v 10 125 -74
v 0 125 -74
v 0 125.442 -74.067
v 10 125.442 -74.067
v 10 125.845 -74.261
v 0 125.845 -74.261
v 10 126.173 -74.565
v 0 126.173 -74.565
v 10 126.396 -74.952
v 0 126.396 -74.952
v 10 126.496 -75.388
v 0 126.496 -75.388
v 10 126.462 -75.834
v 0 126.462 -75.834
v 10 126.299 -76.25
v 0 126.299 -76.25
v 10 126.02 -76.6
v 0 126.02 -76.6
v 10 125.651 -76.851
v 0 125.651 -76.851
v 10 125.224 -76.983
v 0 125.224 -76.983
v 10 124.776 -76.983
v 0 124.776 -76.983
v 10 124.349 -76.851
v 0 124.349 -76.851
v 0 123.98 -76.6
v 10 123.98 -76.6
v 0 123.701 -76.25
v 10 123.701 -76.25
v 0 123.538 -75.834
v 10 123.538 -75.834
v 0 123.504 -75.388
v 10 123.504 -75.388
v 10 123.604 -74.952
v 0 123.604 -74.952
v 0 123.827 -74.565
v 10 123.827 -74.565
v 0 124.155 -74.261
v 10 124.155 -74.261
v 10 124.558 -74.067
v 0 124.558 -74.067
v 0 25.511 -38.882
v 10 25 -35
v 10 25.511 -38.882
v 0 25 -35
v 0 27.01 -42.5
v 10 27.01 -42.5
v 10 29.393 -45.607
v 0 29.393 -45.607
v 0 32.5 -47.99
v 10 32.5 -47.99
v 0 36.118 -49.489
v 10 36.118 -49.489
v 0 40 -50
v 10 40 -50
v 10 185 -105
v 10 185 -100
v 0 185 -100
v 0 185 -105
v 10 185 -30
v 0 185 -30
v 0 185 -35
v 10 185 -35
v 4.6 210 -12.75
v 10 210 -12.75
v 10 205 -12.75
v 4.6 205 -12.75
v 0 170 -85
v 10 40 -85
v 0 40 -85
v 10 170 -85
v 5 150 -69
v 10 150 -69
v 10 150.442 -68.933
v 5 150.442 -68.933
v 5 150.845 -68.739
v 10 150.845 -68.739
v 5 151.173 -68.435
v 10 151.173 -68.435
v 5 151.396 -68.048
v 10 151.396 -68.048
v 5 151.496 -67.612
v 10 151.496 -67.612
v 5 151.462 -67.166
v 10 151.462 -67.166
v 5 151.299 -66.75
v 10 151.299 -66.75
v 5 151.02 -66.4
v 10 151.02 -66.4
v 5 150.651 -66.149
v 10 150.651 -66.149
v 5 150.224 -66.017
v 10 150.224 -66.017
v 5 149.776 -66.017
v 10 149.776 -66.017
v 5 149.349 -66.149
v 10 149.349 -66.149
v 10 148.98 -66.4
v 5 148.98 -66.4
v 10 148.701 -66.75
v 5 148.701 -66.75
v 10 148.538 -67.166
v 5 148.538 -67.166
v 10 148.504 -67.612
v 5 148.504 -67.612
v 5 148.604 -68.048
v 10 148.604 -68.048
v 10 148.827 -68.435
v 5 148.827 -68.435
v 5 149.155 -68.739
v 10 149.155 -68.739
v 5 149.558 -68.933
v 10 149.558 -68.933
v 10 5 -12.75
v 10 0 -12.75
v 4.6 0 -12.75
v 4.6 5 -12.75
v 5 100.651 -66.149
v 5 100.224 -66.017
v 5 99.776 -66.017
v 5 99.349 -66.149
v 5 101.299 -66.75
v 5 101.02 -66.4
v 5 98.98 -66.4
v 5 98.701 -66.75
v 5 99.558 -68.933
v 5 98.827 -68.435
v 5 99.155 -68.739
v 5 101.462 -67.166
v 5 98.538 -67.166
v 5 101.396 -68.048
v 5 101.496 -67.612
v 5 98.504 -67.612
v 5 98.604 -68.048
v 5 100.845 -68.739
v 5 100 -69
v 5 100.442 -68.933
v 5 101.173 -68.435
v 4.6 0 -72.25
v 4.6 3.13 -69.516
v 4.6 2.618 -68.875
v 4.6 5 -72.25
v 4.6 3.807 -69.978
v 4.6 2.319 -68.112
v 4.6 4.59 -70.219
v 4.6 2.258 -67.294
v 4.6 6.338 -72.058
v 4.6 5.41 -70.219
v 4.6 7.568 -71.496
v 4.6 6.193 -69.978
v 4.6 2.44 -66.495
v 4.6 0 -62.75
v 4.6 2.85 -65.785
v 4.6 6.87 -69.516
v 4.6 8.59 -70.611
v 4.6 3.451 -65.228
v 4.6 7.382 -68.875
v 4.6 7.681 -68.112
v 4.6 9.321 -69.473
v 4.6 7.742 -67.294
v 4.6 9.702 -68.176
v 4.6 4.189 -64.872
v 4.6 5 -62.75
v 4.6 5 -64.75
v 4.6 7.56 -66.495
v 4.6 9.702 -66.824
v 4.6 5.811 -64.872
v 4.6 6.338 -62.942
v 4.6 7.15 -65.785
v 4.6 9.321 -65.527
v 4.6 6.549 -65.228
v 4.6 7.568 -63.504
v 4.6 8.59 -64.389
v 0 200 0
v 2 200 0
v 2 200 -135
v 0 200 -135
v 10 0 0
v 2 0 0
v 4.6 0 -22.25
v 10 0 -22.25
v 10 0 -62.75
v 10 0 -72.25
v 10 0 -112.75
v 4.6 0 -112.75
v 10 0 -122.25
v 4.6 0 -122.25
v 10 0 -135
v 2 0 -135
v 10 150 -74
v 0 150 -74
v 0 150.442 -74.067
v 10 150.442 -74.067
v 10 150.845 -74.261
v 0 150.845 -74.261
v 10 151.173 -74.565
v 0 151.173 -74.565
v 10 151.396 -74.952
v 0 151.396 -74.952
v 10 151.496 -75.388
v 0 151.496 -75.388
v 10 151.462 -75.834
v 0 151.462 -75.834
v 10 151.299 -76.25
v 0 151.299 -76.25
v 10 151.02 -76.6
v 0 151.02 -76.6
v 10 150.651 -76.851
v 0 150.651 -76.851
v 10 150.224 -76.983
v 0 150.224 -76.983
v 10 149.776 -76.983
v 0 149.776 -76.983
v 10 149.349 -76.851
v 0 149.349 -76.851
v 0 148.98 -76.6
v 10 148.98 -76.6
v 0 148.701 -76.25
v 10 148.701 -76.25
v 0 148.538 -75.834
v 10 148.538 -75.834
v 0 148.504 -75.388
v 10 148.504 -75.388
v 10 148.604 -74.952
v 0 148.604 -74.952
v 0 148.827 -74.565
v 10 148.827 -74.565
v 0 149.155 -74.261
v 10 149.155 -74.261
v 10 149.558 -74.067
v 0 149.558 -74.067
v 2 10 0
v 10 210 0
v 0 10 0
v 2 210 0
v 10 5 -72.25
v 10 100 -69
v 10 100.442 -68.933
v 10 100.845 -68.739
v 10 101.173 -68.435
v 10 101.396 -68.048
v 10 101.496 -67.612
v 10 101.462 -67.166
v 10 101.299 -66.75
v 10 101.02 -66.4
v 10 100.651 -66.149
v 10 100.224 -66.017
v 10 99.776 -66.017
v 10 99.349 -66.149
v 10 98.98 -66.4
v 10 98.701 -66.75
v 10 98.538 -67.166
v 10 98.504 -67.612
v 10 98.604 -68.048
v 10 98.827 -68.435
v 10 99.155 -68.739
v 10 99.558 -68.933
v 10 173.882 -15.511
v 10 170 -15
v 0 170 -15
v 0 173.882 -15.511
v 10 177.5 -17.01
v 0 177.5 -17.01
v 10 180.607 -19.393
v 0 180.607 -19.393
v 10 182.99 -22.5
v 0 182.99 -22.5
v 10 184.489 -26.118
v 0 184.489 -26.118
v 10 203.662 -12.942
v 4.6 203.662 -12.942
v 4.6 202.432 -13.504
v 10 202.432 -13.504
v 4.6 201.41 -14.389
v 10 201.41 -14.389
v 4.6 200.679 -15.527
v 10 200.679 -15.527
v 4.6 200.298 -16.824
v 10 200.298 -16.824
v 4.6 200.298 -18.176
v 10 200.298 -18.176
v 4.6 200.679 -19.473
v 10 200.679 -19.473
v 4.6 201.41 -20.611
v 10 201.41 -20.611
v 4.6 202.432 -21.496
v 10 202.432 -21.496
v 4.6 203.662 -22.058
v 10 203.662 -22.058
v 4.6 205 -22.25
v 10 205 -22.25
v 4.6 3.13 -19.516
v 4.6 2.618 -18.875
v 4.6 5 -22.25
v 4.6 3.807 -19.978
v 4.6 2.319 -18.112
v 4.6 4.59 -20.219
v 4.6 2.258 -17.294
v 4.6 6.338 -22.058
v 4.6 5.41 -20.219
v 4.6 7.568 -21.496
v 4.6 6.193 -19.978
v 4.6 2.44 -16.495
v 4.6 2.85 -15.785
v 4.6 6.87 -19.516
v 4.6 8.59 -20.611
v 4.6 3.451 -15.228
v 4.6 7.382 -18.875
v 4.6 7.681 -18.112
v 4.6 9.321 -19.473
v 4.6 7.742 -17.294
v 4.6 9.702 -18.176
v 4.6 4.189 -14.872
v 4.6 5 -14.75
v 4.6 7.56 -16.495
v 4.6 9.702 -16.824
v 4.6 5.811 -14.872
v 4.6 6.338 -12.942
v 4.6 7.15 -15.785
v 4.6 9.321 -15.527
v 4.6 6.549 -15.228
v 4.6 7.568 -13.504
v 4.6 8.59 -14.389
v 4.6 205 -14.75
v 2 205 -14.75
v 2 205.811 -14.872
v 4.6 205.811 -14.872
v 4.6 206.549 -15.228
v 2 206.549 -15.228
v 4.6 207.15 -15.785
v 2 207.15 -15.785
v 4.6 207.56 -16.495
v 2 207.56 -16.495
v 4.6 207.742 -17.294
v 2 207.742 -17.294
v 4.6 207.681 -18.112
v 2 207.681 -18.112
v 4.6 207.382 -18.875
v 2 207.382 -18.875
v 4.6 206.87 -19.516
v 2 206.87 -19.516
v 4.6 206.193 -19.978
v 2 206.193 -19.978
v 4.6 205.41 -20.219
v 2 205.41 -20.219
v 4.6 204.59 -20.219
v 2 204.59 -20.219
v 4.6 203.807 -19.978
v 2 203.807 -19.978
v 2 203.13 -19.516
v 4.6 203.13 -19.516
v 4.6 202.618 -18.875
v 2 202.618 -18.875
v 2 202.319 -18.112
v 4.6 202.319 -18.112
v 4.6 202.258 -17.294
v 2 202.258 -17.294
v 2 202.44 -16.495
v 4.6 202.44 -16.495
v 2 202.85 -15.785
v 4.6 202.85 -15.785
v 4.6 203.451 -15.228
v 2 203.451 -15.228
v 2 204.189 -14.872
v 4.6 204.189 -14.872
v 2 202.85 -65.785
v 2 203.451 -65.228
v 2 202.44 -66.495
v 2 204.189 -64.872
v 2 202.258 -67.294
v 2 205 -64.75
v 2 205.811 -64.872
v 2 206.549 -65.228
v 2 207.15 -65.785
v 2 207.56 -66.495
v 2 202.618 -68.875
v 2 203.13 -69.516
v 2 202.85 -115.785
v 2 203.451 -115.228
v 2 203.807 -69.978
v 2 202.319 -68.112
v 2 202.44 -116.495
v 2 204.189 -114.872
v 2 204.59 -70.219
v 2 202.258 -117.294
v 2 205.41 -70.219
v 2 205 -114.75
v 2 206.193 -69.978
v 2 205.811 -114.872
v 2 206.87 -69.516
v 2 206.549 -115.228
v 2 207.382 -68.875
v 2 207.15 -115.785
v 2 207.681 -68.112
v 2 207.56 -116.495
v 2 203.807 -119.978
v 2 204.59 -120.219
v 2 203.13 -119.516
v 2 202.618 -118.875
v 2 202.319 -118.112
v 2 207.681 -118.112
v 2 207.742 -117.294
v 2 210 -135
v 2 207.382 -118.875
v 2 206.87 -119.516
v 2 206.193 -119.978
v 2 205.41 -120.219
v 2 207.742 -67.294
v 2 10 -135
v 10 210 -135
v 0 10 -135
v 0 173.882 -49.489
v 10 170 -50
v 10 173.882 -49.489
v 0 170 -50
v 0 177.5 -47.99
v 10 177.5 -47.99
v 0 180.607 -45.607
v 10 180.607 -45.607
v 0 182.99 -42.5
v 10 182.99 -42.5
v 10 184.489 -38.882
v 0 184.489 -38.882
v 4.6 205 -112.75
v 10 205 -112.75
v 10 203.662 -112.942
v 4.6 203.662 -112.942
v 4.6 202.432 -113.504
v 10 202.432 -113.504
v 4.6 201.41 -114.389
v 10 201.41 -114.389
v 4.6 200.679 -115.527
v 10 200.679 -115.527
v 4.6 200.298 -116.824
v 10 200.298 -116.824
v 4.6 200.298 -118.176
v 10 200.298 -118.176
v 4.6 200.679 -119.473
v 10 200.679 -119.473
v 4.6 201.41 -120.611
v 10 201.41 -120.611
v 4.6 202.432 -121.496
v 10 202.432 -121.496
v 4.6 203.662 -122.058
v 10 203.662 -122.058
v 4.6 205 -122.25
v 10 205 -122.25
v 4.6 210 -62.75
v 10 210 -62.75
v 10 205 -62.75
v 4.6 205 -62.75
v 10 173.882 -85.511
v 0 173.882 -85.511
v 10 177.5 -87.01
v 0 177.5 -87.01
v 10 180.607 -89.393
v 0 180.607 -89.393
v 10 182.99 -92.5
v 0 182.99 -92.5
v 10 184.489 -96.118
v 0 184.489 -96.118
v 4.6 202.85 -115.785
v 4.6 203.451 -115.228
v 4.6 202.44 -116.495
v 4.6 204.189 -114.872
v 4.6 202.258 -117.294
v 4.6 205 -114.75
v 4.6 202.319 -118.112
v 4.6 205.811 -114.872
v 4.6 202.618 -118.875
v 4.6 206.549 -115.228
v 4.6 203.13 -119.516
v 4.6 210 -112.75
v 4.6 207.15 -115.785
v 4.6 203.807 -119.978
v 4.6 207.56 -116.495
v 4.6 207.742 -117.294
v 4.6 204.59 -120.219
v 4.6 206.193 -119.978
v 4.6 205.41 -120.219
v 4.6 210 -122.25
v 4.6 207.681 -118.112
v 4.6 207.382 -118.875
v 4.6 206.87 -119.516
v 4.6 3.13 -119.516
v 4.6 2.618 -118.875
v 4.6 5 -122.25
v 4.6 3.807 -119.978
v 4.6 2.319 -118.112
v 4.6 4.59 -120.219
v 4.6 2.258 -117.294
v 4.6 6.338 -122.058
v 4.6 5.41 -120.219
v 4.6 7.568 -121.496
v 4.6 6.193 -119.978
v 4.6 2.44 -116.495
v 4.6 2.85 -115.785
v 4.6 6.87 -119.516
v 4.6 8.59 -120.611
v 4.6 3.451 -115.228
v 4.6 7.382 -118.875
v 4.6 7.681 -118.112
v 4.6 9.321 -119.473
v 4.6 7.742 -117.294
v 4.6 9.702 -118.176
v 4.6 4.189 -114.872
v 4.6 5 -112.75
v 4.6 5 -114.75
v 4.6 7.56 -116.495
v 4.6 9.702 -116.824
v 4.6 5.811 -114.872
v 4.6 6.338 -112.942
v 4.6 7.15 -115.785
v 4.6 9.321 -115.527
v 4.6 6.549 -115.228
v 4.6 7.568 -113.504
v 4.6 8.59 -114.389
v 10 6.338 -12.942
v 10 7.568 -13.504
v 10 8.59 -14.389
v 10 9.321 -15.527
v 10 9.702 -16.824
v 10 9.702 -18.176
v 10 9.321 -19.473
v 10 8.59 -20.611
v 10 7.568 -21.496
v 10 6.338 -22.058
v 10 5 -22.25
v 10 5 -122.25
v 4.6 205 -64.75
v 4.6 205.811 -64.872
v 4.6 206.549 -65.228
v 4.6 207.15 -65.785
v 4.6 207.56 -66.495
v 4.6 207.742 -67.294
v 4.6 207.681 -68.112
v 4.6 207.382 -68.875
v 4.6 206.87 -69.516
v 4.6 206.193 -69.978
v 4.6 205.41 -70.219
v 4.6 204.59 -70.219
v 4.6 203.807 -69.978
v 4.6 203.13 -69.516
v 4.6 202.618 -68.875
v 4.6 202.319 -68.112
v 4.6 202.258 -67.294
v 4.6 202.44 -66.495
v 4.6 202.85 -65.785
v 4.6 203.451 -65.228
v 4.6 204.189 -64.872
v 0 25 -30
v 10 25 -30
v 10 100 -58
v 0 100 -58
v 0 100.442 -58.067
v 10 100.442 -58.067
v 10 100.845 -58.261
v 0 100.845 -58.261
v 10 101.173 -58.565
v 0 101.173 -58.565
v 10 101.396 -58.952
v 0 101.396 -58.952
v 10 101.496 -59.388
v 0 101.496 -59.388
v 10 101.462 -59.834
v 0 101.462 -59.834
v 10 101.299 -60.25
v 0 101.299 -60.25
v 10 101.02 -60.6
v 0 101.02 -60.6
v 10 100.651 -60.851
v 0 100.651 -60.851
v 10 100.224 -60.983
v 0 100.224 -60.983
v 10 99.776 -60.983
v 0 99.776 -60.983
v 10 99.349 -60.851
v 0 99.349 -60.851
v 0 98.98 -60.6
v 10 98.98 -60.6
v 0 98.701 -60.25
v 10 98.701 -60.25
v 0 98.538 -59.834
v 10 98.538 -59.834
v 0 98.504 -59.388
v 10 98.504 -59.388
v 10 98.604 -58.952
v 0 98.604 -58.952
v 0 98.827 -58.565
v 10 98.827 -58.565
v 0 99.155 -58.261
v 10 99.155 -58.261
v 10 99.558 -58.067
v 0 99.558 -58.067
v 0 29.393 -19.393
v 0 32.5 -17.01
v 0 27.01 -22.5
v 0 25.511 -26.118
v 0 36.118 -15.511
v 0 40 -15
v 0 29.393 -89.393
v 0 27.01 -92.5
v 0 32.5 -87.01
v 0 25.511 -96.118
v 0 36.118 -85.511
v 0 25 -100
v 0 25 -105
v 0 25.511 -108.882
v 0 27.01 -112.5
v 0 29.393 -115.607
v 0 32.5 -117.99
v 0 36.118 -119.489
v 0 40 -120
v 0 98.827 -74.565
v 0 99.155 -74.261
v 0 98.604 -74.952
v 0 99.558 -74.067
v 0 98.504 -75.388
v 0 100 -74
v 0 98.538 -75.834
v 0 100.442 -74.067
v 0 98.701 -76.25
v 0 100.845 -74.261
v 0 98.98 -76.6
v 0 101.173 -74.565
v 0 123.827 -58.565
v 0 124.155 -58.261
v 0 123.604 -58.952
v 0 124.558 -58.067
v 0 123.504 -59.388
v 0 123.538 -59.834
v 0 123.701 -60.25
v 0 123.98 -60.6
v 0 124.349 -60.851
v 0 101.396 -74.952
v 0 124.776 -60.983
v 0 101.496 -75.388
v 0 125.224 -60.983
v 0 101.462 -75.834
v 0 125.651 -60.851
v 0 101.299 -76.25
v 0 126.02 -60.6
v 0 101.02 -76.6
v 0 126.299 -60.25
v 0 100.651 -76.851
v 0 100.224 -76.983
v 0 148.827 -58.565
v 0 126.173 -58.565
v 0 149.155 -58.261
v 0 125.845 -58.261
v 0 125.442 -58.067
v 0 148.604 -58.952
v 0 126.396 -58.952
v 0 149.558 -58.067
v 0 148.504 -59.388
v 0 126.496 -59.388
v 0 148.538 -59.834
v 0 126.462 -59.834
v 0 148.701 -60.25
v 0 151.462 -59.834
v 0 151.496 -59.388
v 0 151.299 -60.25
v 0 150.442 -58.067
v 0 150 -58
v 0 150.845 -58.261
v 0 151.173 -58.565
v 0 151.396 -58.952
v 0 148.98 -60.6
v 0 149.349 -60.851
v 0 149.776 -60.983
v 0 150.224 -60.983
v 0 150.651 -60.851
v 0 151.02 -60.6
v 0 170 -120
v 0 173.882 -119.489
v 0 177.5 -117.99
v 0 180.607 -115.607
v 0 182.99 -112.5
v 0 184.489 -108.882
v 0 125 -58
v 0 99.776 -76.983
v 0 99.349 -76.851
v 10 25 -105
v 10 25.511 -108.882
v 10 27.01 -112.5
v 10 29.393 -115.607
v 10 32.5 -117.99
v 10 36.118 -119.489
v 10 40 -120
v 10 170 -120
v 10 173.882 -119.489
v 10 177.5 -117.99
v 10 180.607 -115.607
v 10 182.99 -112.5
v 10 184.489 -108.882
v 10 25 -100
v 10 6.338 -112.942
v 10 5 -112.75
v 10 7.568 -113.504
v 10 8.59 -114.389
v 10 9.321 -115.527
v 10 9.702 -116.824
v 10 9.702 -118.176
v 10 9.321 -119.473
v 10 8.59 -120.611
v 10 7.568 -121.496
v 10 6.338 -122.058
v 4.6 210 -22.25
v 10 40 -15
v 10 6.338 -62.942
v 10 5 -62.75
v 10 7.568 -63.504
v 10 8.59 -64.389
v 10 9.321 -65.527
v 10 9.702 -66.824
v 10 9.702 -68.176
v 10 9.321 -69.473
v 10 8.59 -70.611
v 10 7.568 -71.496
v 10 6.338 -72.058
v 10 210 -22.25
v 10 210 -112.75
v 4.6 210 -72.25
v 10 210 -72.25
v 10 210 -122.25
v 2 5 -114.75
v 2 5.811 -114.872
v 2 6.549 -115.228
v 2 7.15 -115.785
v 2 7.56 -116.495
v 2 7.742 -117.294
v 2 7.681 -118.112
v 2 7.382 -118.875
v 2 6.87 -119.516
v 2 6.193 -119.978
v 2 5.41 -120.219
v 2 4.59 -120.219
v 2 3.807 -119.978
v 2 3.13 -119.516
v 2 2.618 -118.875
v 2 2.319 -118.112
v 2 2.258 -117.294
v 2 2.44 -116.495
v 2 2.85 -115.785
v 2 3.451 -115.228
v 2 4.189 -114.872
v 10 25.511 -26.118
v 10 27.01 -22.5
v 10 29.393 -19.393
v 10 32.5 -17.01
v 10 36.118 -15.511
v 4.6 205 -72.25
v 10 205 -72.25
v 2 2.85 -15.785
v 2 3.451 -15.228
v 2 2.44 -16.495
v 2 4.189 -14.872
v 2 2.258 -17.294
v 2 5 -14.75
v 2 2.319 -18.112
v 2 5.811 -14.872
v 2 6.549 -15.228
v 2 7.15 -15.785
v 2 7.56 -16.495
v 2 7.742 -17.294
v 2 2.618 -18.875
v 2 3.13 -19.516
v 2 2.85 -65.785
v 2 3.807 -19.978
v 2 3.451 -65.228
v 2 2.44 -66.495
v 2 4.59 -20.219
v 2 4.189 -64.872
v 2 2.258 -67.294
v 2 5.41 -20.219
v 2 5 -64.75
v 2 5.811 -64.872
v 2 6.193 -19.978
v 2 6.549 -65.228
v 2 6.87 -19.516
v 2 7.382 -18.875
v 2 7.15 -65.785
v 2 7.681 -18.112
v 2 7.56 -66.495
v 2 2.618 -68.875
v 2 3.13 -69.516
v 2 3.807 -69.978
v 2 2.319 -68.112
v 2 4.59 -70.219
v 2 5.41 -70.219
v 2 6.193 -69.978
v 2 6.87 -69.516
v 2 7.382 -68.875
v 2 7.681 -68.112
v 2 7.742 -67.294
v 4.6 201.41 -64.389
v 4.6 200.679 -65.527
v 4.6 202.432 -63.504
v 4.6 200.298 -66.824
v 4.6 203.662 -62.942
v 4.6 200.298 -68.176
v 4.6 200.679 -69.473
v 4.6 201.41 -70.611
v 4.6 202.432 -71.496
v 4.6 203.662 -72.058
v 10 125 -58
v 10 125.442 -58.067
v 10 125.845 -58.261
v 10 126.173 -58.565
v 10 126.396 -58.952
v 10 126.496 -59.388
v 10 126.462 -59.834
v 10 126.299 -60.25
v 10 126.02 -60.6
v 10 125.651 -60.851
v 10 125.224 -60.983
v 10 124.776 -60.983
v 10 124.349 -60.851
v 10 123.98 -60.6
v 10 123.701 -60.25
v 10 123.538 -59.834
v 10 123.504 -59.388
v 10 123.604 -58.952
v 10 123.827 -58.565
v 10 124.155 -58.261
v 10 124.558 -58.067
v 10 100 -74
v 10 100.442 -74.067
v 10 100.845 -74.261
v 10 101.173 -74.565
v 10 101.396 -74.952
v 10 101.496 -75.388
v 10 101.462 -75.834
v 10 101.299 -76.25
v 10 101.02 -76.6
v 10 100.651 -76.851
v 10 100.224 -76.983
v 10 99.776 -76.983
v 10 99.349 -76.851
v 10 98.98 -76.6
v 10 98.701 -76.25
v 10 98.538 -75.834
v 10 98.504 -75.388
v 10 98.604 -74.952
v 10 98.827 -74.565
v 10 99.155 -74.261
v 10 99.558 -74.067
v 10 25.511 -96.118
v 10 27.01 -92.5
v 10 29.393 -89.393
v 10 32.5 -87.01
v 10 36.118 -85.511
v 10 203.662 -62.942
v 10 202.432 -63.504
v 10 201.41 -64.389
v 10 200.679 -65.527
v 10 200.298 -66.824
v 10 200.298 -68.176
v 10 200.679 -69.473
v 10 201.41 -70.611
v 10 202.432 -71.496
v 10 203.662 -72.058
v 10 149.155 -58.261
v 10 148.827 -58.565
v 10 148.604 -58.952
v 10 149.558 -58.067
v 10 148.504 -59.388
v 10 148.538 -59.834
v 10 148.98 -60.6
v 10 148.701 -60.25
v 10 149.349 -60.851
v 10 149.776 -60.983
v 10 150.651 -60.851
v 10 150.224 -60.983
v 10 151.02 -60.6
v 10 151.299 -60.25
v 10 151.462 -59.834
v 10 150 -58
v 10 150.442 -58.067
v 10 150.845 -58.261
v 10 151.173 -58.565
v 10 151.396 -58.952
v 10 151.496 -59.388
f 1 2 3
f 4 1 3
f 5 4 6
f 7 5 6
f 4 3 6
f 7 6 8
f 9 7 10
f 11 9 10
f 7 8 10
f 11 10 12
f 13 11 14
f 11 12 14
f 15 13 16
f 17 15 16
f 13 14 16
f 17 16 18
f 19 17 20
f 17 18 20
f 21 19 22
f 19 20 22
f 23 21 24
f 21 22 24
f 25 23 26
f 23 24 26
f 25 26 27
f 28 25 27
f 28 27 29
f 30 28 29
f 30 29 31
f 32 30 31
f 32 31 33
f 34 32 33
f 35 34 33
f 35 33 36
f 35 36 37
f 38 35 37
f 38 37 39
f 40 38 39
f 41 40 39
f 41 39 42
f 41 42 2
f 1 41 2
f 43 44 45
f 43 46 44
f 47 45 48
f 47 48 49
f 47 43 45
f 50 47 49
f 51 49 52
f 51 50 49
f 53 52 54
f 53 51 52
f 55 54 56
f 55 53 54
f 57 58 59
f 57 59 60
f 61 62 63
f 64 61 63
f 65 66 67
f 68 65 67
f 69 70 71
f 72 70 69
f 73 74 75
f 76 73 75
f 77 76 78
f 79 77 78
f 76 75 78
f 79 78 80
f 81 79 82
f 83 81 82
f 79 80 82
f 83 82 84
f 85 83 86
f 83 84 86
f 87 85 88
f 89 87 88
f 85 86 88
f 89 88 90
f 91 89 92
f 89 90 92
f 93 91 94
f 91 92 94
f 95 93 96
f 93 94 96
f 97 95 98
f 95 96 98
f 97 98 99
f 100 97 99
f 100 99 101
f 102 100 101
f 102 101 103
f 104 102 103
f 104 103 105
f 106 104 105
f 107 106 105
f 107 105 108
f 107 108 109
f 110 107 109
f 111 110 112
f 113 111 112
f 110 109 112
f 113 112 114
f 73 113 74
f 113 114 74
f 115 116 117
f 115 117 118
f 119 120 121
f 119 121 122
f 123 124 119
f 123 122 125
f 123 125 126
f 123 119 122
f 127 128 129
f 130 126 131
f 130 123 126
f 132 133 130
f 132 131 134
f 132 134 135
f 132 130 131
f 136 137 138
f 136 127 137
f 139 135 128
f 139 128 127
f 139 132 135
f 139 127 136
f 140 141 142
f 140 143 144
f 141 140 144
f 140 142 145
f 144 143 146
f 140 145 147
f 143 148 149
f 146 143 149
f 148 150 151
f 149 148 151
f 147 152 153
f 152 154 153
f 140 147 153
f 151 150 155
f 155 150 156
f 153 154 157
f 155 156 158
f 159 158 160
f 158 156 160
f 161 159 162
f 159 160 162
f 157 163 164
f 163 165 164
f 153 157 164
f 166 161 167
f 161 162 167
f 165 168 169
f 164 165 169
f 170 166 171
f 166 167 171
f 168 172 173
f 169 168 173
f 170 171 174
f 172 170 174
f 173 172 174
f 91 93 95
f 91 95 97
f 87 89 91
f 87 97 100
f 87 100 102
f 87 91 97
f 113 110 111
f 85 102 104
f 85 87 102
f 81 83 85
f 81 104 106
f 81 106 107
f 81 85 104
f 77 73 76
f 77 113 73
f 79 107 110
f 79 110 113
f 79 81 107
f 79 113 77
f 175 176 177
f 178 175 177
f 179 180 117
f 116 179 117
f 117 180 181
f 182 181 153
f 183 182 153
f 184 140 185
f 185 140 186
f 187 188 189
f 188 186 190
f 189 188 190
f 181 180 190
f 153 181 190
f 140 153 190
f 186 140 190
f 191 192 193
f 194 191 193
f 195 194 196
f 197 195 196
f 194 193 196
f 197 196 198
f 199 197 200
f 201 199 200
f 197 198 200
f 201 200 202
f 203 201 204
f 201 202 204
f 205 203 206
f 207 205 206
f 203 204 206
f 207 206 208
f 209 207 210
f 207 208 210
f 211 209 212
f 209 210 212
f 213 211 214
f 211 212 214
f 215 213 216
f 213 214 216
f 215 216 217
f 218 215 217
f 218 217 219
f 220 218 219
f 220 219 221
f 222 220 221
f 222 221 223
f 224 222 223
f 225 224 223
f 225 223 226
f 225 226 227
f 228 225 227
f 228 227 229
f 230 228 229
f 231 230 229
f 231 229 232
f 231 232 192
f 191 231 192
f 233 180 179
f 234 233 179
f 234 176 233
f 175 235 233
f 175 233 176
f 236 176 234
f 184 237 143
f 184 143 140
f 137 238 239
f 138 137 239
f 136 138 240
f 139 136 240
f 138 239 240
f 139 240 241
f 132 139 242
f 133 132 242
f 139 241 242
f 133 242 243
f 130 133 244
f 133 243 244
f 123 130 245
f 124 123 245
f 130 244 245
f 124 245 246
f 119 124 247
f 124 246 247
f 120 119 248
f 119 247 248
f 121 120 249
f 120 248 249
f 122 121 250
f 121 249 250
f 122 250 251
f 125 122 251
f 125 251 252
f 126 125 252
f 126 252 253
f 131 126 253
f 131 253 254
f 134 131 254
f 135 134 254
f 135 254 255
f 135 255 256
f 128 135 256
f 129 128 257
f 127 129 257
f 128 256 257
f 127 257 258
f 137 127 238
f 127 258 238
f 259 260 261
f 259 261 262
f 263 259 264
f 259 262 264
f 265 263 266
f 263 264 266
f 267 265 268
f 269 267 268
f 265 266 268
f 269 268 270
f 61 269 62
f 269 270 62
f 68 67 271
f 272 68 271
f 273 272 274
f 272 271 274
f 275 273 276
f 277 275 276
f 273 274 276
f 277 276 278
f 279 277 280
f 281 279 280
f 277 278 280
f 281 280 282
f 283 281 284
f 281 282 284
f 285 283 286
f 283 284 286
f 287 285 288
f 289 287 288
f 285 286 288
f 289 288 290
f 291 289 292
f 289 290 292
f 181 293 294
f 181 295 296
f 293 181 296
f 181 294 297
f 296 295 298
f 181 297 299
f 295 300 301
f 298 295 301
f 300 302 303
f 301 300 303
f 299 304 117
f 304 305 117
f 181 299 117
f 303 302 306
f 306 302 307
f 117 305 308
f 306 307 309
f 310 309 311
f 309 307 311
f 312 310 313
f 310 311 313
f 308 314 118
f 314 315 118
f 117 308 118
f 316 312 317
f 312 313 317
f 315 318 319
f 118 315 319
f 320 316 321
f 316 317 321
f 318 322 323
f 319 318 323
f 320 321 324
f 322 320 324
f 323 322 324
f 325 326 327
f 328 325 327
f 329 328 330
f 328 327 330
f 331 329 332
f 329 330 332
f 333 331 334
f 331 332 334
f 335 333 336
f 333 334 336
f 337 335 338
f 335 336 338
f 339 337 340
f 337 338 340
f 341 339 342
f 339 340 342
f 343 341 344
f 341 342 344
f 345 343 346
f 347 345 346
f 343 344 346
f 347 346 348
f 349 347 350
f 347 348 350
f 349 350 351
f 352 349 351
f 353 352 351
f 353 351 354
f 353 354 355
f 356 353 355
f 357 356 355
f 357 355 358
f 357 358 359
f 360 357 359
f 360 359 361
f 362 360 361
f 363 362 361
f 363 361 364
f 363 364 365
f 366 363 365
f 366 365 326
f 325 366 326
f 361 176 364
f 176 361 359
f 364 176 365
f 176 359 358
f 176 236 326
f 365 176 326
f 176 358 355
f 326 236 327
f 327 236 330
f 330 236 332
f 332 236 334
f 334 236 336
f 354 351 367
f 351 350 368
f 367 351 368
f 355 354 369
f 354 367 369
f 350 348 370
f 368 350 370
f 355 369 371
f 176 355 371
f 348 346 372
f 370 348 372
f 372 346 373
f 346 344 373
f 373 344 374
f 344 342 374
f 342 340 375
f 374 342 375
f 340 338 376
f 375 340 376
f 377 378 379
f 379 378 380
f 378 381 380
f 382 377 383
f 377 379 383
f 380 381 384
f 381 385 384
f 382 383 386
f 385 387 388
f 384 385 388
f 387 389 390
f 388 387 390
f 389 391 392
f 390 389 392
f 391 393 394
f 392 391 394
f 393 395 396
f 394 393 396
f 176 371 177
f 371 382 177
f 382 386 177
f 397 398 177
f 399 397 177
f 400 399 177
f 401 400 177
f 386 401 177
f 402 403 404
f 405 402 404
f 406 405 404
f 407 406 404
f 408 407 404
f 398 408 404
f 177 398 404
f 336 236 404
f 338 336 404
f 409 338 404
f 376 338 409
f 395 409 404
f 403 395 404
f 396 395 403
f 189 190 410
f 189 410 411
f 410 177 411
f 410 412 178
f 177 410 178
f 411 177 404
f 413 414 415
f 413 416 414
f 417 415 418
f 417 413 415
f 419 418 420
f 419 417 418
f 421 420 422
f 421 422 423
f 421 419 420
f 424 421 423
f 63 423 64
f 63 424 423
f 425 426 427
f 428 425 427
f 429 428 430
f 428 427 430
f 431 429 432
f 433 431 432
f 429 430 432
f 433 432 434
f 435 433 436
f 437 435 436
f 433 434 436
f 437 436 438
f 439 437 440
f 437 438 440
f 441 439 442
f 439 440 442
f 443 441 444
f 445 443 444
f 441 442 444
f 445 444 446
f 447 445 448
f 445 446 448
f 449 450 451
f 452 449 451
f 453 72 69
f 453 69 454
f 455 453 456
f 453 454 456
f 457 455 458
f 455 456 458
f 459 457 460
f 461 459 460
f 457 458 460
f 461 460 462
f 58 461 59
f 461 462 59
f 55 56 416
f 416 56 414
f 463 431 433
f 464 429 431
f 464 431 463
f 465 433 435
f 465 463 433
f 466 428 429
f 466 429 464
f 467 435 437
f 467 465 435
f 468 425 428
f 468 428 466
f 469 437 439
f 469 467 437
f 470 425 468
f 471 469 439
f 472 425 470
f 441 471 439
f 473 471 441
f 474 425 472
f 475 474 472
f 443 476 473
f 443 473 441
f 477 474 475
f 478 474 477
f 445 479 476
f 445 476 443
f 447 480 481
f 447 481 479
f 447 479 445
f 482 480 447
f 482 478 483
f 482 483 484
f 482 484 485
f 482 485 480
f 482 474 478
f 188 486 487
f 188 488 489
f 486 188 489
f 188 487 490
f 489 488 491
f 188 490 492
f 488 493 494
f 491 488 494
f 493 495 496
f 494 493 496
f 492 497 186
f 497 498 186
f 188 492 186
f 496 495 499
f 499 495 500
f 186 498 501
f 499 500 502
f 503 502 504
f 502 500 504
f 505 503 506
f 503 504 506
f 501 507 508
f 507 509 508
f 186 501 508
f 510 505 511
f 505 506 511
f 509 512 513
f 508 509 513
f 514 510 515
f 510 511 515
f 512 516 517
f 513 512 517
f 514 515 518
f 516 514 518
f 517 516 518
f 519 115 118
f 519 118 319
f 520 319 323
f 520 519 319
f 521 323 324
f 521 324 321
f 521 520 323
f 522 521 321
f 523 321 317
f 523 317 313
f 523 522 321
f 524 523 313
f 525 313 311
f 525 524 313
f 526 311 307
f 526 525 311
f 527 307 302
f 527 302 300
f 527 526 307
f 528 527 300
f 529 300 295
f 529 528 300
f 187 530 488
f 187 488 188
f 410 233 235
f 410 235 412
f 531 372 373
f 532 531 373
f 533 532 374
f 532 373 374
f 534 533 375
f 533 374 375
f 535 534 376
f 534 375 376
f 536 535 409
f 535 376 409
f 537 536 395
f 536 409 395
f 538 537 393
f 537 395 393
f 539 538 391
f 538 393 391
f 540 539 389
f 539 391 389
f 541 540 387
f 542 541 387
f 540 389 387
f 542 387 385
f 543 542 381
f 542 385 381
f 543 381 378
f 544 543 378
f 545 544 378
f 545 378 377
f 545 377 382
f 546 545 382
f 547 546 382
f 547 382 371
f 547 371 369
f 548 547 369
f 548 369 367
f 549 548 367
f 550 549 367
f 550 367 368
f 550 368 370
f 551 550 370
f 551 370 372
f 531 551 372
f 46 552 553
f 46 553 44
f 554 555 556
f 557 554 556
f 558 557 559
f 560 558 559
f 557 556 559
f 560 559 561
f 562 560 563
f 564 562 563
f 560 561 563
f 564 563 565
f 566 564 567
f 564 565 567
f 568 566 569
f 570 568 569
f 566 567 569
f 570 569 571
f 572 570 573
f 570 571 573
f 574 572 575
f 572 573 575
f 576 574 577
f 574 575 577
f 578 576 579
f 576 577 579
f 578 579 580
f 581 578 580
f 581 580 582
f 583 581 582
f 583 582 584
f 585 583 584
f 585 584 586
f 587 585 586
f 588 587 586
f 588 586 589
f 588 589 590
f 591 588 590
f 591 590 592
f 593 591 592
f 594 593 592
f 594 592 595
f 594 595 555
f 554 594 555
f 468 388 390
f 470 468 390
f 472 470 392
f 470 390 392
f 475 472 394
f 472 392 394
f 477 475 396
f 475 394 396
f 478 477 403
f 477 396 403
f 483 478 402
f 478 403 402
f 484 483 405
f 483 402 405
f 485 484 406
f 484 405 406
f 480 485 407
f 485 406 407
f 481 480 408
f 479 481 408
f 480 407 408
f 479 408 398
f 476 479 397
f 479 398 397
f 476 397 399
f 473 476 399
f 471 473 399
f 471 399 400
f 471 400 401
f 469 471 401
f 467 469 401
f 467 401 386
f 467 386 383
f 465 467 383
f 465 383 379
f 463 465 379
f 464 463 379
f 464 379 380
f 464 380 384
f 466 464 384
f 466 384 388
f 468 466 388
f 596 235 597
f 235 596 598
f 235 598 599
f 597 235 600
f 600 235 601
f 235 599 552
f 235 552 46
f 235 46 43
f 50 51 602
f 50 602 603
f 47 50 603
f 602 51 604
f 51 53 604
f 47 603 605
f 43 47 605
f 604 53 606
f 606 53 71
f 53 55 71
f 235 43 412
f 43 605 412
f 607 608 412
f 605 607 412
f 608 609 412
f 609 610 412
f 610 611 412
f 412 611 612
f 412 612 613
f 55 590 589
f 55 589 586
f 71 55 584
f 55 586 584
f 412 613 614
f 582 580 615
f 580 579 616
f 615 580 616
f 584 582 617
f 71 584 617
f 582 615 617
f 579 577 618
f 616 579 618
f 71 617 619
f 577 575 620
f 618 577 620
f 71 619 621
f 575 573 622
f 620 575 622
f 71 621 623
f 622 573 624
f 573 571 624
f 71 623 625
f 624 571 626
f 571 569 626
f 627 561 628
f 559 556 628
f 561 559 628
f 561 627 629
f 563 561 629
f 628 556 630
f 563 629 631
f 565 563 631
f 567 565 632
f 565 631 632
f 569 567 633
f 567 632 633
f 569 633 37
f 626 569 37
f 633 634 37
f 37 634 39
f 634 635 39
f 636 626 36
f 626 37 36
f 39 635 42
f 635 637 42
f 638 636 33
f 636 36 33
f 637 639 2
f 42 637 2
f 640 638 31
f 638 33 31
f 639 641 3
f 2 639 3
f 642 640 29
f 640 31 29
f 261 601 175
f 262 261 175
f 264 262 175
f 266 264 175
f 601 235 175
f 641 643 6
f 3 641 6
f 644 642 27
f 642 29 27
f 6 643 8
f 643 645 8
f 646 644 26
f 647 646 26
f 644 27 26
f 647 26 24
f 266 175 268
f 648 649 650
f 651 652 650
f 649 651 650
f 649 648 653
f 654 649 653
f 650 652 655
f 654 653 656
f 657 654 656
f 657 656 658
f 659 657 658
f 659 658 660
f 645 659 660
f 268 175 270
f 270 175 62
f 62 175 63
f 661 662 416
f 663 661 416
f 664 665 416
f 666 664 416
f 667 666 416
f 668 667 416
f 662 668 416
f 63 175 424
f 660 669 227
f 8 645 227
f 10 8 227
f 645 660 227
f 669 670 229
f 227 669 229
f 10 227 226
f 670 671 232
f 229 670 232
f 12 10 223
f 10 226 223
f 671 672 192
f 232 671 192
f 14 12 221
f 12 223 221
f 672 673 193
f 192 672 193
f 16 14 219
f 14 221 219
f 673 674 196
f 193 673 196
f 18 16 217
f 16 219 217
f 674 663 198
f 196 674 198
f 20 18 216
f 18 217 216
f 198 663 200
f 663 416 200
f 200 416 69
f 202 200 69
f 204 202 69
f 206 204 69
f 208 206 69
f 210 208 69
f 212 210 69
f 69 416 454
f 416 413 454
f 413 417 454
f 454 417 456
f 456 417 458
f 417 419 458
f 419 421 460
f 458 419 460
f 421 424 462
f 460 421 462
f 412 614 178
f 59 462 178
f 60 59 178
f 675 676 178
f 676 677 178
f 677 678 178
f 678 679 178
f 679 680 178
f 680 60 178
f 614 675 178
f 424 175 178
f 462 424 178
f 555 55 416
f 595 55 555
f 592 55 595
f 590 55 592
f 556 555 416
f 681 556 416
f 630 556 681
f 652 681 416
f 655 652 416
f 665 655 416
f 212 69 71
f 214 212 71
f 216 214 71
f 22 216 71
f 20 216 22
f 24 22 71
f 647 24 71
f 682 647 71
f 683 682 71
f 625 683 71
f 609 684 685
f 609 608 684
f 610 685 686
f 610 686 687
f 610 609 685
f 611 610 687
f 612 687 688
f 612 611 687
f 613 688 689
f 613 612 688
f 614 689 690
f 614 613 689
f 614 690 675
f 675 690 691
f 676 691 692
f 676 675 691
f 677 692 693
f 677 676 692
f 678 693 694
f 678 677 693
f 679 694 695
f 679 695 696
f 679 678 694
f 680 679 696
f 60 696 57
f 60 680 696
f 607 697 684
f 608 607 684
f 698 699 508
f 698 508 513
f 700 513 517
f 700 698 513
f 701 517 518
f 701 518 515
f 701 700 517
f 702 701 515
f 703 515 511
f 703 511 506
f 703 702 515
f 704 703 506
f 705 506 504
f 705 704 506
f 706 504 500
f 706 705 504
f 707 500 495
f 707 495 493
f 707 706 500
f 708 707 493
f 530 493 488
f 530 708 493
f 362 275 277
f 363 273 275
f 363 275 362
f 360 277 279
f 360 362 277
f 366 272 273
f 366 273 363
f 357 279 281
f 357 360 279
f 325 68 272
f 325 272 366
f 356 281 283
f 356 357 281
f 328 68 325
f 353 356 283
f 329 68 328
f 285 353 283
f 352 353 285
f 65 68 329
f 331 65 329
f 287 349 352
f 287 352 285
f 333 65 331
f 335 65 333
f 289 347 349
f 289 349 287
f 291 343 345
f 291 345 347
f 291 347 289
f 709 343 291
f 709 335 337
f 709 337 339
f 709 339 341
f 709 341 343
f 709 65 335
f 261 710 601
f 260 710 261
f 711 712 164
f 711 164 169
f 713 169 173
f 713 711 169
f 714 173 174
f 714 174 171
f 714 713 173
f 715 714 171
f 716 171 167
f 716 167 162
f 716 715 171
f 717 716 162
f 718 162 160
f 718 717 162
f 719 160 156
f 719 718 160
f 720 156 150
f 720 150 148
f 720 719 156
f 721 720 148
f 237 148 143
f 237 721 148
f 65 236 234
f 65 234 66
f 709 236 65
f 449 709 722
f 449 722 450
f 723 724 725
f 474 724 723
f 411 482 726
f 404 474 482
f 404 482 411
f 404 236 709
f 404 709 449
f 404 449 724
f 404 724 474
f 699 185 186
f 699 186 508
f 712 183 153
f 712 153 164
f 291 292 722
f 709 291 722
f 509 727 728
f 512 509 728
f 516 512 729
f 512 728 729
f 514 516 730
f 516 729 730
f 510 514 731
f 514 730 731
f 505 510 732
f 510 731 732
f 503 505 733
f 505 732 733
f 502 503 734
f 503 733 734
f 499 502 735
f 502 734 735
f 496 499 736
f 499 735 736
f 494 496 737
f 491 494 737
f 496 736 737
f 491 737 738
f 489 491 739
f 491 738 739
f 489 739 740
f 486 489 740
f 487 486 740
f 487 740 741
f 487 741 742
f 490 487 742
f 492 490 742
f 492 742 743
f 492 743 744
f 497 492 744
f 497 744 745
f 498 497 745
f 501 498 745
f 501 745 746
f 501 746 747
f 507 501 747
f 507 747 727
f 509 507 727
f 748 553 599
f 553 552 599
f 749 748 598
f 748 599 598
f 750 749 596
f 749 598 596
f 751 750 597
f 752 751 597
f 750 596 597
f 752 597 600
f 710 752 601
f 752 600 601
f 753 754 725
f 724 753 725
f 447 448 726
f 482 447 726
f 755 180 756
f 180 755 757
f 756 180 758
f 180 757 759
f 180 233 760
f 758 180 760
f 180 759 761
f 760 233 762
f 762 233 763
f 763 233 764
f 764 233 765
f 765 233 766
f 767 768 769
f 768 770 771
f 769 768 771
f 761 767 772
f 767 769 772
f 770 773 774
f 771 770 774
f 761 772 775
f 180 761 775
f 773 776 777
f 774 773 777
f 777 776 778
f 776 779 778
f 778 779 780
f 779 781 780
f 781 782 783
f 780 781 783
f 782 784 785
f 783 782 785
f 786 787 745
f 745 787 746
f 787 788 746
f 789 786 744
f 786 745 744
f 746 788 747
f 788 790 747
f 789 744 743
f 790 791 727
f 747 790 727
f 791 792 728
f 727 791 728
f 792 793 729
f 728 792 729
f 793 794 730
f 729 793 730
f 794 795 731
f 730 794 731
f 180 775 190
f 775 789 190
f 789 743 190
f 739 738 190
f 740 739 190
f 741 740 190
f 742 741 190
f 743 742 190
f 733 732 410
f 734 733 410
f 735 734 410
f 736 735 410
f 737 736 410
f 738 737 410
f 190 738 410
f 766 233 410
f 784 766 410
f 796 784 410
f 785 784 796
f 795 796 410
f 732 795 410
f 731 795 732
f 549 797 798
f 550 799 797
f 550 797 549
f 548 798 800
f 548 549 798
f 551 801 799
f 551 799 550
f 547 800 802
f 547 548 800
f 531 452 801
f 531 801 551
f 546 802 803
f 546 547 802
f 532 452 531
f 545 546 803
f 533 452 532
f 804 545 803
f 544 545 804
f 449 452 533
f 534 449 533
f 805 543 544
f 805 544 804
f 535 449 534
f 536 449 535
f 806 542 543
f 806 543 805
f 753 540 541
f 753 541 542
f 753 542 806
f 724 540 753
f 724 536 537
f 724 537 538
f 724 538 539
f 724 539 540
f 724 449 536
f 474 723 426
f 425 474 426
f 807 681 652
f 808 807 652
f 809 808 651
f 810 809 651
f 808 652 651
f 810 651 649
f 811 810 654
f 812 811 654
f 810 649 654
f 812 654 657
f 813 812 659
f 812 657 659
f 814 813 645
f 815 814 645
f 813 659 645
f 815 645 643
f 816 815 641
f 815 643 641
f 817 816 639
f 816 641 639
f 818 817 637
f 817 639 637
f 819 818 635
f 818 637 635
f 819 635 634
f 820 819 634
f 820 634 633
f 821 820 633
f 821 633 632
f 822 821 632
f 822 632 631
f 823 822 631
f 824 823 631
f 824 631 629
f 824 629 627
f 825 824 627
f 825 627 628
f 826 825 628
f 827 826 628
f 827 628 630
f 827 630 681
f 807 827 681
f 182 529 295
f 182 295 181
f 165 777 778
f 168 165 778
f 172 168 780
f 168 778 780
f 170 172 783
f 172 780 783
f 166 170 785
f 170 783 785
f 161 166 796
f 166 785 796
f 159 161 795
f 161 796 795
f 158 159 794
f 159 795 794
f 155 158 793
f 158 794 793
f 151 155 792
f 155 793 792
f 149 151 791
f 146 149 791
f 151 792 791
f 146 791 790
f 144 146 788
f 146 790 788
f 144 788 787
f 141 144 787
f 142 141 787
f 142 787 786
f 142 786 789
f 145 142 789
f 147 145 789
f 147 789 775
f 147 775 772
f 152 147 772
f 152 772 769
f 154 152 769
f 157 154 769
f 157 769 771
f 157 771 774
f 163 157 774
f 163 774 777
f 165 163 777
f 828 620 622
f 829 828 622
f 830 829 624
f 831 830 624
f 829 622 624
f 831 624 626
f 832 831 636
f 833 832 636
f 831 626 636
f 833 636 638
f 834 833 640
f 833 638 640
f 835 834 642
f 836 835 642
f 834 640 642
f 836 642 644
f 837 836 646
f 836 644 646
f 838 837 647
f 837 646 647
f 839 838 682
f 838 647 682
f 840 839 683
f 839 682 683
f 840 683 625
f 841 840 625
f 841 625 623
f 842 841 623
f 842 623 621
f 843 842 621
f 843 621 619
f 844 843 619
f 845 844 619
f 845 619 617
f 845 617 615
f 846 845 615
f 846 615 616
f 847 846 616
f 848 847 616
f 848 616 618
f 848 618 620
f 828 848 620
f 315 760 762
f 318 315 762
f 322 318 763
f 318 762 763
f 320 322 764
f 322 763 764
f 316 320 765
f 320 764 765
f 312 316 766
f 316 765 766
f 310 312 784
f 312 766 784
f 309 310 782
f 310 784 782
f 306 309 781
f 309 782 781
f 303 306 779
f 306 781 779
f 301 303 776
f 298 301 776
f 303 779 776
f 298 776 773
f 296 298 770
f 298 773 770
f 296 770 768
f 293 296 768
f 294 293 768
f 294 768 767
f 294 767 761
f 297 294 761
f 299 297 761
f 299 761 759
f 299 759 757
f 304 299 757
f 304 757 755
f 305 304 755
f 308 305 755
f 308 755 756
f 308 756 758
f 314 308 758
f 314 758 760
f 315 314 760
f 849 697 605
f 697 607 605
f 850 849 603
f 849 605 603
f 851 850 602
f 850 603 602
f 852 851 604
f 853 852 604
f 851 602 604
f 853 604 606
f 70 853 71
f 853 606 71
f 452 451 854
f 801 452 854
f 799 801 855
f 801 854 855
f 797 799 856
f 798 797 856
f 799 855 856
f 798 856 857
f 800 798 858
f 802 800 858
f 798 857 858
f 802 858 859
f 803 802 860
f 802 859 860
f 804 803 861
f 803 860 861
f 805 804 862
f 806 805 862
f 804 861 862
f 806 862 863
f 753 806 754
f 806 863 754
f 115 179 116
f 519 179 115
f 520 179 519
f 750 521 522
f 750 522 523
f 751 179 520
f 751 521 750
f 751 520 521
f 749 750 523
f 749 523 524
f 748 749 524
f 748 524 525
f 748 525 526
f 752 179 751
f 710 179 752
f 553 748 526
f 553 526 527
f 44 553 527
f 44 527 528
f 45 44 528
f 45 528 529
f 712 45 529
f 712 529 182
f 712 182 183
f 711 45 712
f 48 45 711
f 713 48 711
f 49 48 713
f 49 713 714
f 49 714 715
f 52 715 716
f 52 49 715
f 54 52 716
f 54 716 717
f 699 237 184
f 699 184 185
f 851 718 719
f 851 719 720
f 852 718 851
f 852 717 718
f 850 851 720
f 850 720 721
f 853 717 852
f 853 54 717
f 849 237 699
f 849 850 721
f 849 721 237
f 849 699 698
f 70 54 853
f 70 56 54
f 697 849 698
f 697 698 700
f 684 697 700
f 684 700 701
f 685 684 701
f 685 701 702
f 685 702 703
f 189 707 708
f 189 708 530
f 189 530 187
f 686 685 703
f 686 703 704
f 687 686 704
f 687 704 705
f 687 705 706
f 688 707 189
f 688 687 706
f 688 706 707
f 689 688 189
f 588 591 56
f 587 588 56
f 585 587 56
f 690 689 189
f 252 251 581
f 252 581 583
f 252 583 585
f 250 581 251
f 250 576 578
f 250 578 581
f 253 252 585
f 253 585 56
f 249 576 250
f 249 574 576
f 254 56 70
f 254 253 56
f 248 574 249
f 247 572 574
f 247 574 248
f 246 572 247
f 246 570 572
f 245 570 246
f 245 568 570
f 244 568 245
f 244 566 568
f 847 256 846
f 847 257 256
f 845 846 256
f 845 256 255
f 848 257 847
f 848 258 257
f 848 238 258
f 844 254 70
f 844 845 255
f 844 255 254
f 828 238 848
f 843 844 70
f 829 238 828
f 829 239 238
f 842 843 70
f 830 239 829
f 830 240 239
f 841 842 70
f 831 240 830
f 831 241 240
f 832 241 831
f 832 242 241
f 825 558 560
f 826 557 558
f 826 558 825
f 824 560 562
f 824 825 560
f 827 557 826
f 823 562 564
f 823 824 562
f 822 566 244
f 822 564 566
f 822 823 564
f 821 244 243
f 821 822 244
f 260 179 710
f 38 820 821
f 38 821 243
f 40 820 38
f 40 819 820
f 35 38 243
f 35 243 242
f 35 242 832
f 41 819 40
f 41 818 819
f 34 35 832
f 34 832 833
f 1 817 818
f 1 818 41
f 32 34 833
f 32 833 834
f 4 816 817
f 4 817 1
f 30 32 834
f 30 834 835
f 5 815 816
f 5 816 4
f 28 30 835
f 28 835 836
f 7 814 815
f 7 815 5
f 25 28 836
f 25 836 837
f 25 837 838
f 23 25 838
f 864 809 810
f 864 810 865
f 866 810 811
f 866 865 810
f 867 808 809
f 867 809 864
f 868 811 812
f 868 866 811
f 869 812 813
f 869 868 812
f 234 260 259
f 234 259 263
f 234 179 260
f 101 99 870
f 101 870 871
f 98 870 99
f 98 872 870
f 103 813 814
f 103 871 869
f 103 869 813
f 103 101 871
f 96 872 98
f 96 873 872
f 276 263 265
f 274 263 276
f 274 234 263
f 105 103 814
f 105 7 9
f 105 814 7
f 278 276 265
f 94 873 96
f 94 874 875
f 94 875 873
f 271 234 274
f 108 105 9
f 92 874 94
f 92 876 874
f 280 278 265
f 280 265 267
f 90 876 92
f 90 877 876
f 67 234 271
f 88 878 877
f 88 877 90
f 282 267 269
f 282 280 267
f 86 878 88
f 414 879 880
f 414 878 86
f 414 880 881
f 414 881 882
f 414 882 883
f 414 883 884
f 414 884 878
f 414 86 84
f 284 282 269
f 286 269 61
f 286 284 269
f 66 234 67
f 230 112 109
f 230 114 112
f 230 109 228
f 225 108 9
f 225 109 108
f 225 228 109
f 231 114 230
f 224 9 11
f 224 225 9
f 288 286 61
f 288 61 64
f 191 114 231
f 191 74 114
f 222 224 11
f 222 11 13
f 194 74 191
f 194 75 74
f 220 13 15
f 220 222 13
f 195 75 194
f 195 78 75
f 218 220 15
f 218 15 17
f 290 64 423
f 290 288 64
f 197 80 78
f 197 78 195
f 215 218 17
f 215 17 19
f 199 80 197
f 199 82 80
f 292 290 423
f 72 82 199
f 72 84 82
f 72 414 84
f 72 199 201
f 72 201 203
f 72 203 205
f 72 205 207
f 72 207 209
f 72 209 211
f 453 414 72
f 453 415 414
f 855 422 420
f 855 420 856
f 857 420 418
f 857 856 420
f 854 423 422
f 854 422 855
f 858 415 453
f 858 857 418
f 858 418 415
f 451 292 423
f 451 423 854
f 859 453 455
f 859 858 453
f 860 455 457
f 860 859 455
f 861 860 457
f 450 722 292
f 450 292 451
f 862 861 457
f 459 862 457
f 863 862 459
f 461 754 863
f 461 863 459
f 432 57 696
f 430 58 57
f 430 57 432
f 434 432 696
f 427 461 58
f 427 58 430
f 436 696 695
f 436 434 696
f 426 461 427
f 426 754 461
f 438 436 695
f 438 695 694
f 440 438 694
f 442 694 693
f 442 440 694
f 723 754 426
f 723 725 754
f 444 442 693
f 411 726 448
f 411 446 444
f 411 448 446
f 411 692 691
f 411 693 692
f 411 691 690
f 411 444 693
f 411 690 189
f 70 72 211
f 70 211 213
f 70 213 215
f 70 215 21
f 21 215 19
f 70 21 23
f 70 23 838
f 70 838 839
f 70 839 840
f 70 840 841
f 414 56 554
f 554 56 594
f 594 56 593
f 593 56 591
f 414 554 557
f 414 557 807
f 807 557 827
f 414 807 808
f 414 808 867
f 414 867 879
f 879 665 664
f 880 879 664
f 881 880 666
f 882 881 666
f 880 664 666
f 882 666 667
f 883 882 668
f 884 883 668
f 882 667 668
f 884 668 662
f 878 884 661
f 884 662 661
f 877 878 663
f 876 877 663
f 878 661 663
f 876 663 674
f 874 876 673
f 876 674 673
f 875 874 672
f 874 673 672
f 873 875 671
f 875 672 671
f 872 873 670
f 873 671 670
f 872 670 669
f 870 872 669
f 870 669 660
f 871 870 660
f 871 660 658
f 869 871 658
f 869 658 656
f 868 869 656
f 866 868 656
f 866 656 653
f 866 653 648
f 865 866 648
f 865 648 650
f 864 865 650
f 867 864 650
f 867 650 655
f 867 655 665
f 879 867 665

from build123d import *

# Parameters (mm, degrees)
SKETCH1_W                  = 135
SKETCH1_H                  = 210
BOSS_EXTRUDE1_DEPTH        = 10
CUT_EXTRUDE1_START         = -8
SKETCH4_W                  = 135
SKETCH4_H                  = 10
CUT_EXTRUDE1_DEPTH         = 3
SKETCH15_W                 = 35
SKETCH15_H                 = 160
CUT_EXTRUDE2_DEPTH         = 11
SKETCH16_R                 = 1.5
CUT_EXTRUDE3_DEPTH         = 5
CUT_EXTRUDE4_DEPTH         = 5.4
F_3_0_3_DIAMETER_HOLE1_D   = 3
LPATTERN4_COUNT            = 2
LPATTERN4_PITCH            = 16
LPATTERN4_COUNT_DIR2       = 3
LPATTERN4_PITCH_DIR2       = 25
LPATTERN1_COUNT            = 3
LPATTERN1_PITCH            = 50
F_5_5_5_5_DIAMETER_HOLE1_D = 5.5
LPATTERN3_COUNT            = 3
LPATTERN3_PITCH            = 50
FILLET1_R                  = 15


with BuildPart() as part:
    # Sketch1 → Boss-Extrude1 (new body)
    with BuildSketch(Plane(origin=(0, 0, 0), x_dir=(0, 0, -1), z_dir=(1, 0, 0))):
        with Locations((67.5, 105)):
            Rectangle(SKETCH1_W, SKETCH1_H)
    extrude(amount=BOSS_EXTRUDE1_DEPTH)

    # Sketch4 → Cut-Extrude1 (cut, through all)
    with BuildSketch(Plane(origin=(10, 0, 0), x_dir=(0, 0, -1), z_dir=(1, 0, 0)).offset(CUT_EXTRUDE1_START)):
        with Locations((67.5, 5)):
            Rectangle(SKETCH4_W, SKETCH4_H)
        with Locations((67.5, 205)):
            Rectangle(SKETCH4_W, SKETCH4_H)
    extrude(amount=-CUT_EXTRUDE1_DEPTH, mode=Mode.SUBTRACT)

    # Sketch15 → Cut-Extrude2 (cut, through all)
    with BuildSketch(Plane(origin=(10, 0, 0), x_dir=(0, 0, -1), z_dir=(1, 0, 0))):
        with Locations((32.5, 105)):
            Rectangle(SKETCH15_W, SKETCH15_H)
        with Locations((102.5, 105)):
            Rectangle(SKETCH15_W, SKETCH15_H)
    extrude(amount=-CUT_EXTRUDE2_DEPTH, mode=Mode.SUBTRACT)

    # Sketch16 → Cut-Extrude3 (cut)
    with BuildSketch(Plane(origin=(10, 0, 0), x_dir=(0, 0, -1), z_dir=(1, 0, 0))):
        with Locations((67.5, 100)):
            Circle(SKETCH16_R)
        with Locations((67.5, 150)):
            Circle(SKETCH16_R)
    extrude(amount=-CUT_EXTRUDE3_DEPTH, mode=Mode.SUBTRACT)

    # Sketch6 → Cut-Extrude4 (cut)
    with BuildSketch(Plane.ZY.offset(-10)):
        with BuildLine():
            Line((-22.25, 5), (-22.25, 0))
            Line((-22.25, 0), (-12.75, 0))
            Line((-12.75, 0), (-12.75, 5))
            ThreePointArc((-12.75, 5), (-17.5, 9.75), (-22.25, 5))
        make_face()
        with BuildLine():
            Line((-22.25, 205), (-22.25, 210))
            Line((-22.25, 210), (-12.75, 210))
            Line((-12.75, 210), (-12.75, 205))
            ThreePointArc((-12.75, 205), (-17.5, 200.25), (-22.25, 205))
        make_face()
    cut_extrude4 = extrude(amount=CUT_EXTRUDE4_DEPTH, mode=Mode.SUBTRACT)

    # Ø3.0 (3) Diameter Hole1 (through all)
    with Locations(Plane(origin=(10, 0, 0), x_dir=(0, 0, -1), z_dir=(1, 0, 0))):
        with Locations((59.5, 100)):
            f_3_0_3_diameter_hole1 = Hole(F_3_0_3_DIAMETER_HOLE1_D / 2)

    # LPattern4: 3.0 _3_ Diameter Hole1 2 × 3
    with Locations(*[(0, j * LPATTERN4_PITCH_DIR2, -i * LPATTERN4_PITCH) for i in range(LPATTERN4_COUNT) for j in range(LPATTERN4_COUNT_DIR2) if (i, j) != (0, 0)]):
        add(f_3_0_3_diameter_hole1, mode=Mode.SUBTRACT)

    # LPattern1: Cut-Extrude4 ×3
    with Locations(*[(0, 0, -i * LPATTERN1_PITCH) for i in range(1, LPATTERN1_COUNT)]):
        add(cut_extrude4, mode=Mode.SUBTRACT)

    # Ø5.5 (5.5) Diameter Hole1 (through all)
    with Locations(Plane(origin=(4.6, 0, 0), x_dir=(0, 0, -1), z_dir=(1, 0, 0))):
        with Locations((17.5, 205), (17.5, 5)):
            f_5_5_5_5_diameter_hole1 = Hole(F_5_5_5_5_DIAMETER_HOLE1_D / 2)

    # LPattern3: Ø5.5 (5.5) Diameter Hole1 ×3
    with Locations(*[(0, 0, -i * LPATTERN3_PITCH) for i in range(1, LPATTERN3_COUNT)]):
        add(f_5_5_5_5_diameter_hole1, mode=Mode.SUBTRACT)

    # Fillet1
    fillet1_edges = [part.edges().sort_by_distance(p)[0] for p in [
        (5, 25, -15),
        (5, 185, -15),
        (5, 185, -50),
        (5, 25, -50),
        (5, 25, -85),
        (5, 185, -85),
        (5, 185, -120),
        (5, 25, -120),
    ]]
    fillet(fillet1_edges, radius=FILLET1_R)


solid = part.part
